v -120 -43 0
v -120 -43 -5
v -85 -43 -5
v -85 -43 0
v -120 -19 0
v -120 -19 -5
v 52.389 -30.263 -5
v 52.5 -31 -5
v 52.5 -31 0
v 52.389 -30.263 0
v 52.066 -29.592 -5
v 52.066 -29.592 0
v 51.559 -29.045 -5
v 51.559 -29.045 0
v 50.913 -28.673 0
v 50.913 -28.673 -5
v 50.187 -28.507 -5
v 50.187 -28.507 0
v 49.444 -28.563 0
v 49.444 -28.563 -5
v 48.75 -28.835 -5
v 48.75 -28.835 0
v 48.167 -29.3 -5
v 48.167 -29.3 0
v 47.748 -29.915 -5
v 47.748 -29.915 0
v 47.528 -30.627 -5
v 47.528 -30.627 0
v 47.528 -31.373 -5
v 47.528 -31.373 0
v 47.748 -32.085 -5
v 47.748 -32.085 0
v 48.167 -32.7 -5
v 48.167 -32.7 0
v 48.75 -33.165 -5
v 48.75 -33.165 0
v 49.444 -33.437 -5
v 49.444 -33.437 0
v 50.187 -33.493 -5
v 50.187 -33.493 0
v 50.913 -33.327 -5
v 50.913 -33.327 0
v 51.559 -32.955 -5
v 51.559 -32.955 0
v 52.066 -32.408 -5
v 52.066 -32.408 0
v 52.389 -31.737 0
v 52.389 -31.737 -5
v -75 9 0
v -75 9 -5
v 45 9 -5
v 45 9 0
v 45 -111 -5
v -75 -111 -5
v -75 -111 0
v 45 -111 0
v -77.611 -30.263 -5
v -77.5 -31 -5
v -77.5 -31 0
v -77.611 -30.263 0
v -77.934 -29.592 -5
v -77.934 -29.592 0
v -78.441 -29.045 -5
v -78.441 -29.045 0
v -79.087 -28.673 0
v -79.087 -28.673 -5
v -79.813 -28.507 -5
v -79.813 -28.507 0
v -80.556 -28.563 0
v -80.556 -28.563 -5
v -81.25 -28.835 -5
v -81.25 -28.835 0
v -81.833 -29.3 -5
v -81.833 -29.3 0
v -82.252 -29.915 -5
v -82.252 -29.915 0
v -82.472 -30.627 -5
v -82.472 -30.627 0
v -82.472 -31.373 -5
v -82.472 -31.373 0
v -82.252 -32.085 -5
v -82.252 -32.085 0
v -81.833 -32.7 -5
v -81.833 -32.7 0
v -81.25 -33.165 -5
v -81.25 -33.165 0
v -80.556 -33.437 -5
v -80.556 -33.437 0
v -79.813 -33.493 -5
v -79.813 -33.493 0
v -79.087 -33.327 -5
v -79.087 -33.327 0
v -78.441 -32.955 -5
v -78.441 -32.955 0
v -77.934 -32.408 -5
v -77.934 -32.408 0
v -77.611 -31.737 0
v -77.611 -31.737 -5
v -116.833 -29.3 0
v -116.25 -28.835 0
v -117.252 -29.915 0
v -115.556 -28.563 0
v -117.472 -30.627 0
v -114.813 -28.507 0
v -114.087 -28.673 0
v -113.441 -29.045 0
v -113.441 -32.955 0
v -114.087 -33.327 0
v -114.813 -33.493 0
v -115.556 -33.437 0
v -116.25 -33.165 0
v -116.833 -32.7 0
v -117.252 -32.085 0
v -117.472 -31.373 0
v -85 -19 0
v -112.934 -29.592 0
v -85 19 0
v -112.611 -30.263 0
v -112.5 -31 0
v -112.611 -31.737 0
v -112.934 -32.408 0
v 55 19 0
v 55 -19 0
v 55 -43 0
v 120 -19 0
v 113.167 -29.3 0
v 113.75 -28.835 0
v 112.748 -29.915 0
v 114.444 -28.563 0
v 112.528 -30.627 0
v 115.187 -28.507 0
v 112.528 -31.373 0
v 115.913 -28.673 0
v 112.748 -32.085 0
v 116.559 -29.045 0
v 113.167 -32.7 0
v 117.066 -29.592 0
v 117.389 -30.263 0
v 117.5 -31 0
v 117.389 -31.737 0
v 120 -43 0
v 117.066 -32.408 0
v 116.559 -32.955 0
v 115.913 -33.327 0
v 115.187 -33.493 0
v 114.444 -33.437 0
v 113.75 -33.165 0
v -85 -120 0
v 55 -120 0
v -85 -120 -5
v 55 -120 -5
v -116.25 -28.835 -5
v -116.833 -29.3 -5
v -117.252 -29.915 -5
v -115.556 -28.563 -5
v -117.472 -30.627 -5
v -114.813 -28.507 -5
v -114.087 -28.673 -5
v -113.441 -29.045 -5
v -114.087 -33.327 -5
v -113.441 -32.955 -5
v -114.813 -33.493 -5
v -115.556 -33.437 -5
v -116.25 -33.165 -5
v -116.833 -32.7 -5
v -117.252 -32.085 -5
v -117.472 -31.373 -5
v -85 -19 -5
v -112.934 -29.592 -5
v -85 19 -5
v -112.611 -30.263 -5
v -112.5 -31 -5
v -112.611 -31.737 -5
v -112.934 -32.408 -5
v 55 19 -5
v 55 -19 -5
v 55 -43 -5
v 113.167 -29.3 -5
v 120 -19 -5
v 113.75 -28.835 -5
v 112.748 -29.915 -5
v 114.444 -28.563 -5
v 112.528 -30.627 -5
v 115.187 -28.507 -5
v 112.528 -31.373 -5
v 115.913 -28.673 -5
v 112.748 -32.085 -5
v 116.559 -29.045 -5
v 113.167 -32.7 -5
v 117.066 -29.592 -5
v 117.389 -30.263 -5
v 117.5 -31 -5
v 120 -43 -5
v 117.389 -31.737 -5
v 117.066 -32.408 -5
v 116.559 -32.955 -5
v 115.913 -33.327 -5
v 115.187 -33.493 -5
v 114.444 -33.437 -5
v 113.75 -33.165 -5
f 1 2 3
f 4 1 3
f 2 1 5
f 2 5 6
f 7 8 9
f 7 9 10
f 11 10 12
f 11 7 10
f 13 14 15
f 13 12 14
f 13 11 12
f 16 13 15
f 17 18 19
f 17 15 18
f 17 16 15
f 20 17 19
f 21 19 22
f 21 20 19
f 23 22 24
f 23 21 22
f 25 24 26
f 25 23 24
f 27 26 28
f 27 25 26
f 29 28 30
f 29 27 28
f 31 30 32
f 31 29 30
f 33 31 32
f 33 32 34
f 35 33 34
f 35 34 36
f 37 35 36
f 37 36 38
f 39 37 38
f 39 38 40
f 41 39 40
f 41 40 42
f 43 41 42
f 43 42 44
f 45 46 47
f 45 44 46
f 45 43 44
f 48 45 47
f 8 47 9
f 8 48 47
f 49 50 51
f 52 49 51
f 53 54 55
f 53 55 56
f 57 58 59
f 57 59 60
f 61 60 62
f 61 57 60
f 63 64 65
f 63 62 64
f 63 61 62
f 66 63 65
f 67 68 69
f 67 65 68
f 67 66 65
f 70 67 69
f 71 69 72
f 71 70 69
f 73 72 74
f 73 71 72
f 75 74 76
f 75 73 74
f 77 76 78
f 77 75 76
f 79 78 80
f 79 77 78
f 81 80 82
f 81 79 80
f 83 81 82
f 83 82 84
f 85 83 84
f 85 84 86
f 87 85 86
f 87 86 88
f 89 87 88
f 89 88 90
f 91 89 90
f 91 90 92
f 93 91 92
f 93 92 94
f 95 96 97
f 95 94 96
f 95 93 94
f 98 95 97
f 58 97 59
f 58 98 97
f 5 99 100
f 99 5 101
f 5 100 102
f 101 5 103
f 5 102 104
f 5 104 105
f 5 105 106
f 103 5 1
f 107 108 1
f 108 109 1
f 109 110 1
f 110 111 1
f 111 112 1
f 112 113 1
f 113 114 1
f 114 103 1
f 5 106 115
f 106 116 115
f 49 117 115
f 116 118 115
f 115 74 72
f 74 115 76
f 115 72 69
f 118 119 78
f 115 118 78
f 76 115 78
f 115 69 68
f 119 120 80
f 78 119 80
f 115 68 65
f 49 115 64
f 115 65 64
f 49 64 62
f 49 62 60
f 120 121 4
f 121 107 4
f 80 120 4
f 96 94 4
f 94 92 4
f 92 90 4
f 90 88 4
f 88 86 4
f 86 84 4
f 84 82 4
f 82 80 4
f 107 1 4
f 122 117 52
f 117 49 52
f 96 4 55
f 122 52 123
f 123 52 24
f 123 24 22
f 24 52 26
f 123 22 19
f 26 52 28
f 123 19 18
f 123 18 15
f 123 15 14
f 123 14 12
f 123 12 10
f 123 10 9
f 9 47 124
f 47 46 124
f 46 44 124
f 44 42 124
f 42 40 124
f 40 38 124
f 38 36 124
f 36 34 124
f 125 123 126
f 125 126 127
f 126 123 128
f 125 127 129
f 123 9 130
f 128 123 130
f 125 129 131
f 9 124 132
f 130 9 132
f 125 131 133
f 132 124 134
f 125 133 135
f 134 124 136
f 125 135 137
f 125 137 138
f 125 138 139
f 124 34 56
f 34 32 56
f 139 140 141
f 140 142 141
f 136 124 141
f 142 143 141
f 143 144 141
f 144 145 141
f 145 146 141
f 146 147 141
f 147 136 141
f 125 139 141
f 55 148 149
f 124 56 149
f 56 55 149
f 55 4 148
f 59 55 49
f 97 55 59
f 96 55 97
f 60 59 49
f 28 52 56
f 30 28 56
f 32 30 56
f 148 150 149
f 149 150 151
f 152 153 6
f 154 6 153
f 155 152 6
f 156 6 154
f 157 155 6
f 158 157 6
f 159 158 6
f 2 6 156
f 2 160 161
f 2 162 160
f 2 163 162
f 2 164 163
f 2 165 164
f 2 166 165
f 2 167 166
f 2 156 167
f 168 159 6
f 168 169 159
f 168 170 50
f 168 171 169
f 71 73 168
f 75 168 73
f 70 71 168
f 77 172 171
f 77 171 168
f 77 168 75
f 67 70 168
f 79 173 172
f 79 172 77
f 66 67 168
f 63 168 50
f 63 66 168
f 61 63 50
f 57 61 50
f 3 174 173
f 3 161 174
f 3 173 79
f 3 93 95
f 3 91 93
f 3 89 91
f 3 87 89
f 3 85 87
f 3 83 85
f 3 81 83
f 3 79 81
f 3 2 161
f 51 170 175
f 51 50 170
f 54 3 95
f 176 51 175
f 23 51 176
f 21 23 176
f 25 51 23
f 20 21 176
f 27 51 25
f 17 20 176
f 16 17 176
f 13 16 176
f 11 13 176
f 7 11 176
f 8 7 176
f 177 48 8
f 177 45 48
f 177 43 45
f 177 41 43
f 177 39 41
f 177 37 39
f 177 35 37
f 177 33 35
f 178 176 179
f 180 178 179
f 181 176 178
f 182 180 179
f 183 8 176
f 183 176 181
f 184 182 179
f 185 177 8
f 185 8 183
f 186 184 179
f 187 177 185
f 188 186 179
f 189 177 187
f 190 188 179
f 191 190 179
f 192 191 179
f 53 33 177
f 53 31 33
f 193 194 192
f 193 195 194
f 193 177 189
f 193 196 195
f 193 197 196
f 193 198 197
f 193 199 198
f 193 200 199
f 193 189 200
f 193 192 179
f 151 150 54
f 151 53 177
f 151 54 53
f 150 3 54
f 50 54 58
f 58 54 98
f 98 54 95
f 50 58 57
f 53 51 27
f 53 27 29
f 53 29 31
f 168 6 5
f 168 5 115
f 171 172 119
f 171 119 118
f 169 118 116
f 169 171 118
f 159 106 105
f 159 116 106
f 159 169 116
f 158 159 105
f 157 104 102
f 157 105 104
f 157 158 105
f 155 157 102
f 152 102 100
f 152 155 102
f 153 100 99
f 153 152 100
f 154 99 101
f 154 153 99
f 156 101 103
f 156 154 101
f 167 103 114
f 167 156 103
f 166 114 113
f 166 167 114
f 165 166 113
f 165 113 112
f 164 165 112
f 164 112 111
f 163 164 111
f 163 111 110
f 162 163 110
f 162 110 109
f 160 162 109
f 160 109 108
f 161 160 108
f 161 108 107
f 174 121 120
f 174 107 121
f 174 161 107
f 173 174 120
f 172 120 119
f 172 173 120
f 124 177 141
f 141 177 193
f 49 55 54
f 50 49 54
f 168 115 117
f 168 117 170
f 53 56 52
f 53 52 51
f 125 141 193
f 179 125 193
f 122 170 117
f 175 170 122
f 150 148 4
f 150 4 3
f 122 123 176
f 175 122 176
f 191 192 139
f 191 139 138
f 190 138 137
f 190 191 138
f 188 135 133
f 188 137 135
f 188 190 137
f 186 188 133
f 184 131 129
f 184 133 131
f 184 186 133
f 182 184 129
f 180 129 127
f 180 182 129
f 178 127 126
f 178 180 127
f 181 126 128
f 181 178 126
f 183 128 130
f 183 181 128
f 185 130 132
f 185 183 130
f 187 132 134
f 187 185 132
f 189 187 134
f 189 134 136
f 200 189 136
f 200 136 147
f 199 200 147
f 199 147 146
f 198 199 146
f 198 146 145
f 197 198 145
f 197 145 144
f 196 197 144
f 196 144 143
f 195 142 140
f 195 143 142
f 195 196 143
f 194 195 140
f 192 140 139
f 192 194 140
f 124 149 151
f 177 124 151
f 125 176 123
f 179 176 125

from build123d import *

# Parameters (mm, degrees)
BOX019_W               = 120
BOX019_H               = 30
BOX019_DEPTH           = 120
CYLINDER075_R          = 2.5
CYLINDER075_DEPTH      = 10
CYLINDER076_R          = 2.5
CYLINDER076_DEPTH      = 10
CYLINDER077_R          = 2.5
CYLINDER077_DEPTH      = 10
CYLINDER078_R          = 2.5
CYLINDER078_DEPTH      = 10
CYLINDER074_R          = 2.5
CYLINDER074_DEPTH      = 10
CYLINDER079_R          = 2.5
CYLINDER079_DEPTH      = 10
BOX016_W               = 240
BOX016_H               = 5
BOX016_DEPTH           = 24
BOX017_W               = 140
BOX017_H               = 5
BOX017_DEPTH           = 38
BOX018_W               = 140
BOX018_H               = 5
BOX018_DEPTH           = 77
CUT010_PLACEMENT_ANGLE = 270


with BuildPart() as gatewaycut002:
    # Box019 → Box019 (new body)
    with BuildSketch(Plane(origin=(-75, -3.2, -111), x_dir=(1, 0, 0), z_dir=(0, 0, 1))):
        with Locations((60, 15)):
            Rectangle(BOX019_W, BOX019_H)
    extrude(amount=BOX019_DEPTH)


with BuildPart() as cylinder075:
    # Cylinder075 → Cylinder075 (new body)
    with BuildSketch(Plane(origin=(115, 0, -31), x_dir=(1, 0, 0), z_dir=(0, -1, 0))):
        Circle(CYLINDER075_R)
    extrude(amount=CYLINDER075_DEPTH)


with BuildPart() as cylinder076:
    # Cylinder076 → Cylinder076 (new body)
    with BuildSketch(Plane(origin=(-80, 0, -31), x_dir=(1, 0, 0), z_dir=(0, -1, 0))):
        Circle(CYLINDER076_R)
    extrude(amount=CYLINDER076_DEPTH)


with BuildPart() as cylinder077:
    # Cylinder077 → Cylinder077 (new body)
    with BuildSketch(Plane(origin=(50, 0, -31), x_dir=(1, 0, 0), z_dir=(0, -1, 0))):
        Circle(CYLINDER077_R)
    extrude(amount=CYLINDER077_DEPTH)


with BuildPart() as cylinder078:
    # Cylinder078 → Cylinder078 (new body)
    with BuildSketch(Plane(origin=(-45.75, 0, -56.3), x_dir=(1, 0, 0), z_dir=(0, -1, 0))):
        Circle(CYLINDER078_R)
    extrude(amount=CYLINDER078_DEPTH)


with BuildPart() as cylinder074:
    # Cylinder074 → Cylinder074 (new body)
    with BuildSketch(Plane(origin=(-115, 0, -31), x_dir=(1, 0, 0), z_dir=(0, -1, 0))):
        Circle(CYLINDER074_R)
    extrude(amount=CYLINDER074_DEPTH)


with BuildPart() as m3heatsetinserts004:
    # Cylinder079 → Cylinder079 (new body)
    with BuildSketch(Plane(origin=(-45.75, 0, -1.3), x_dir=(1, 0, 0), z_dir=(0, -1, 0))):
        Circle(CYLINDER079_R)
    extrude(amount=CYLINDER079_DEPTH)

    # Fusion028: union Cylinder075, Cylinder076, Cylinder077, Cylinder078, Cylinder074
    add(cylinder075.part)
    add(cylinder076.part)
    add(cylinder077.part)
    add(cylinder078.part)
    add(cylinder074.part)


with BuildPart() as m3heatsetinserts004_1:
    # Fusion028 placement: moved
    add(m3heatsetinserts004.part.moved(Location((0, 5.1, 0))))


with BuildPart() as cube013:
    # Box016 → Box016 (new body)
    with BuildSketch(Plane(origin=(-120, 0, -43), x_dir=(1, 0, 0), z_dir=(0, 0, 1))):
        with Locations((120, 2.5)):
            Rectangle(BOX016_W, BOX016_H)
    extrude(amount=BOX016_DEPTH)


with BuildPart() as cube014:
    # Box017 → Box017 (new body)
    with BuildSketch(Plane(origin=(-85, 0, -19), x_dir=(1, 0, 0), z_dir=(0, 0, 1))):
        with Locations((70, 2.5)):
            Rectangle(BOX017_W, BOX017_H)
    extrude(amount=BOX017_DEPTH)


with BuildPart() as mainbasev2:
    # Box018 → Box018 (new body)
    with BuildSketch(Plane(origin=(-85, 0, -120), x_dir=(1, 0, 0), z_dir=(0, 0, 1))):
        with Locations((70, 2.5)):
            Rectangle(BOX018_W, BOX018_H)
    extrude(amount=BOX018_DEPTH)

    # Fusion027: union Cube013, Cube014
    add(cube013.part)
    add(cube014.part)

    # Cut009: cut M3HeatSetInserts004
    add(m3heatsetinserts004_1.part, mode=Mode.SUBTRACT)

    # Cut010: cut GatewayCut002
    add(gatewaycut002.part, mode=Mode.SUBTRACT)


with BuildPart() as mainbasev2_1:
    # Cut010 placement: moved
    add(mainbasev2.part.rotate(Axis((0, 0, 0), (1, 0, 0)), CUT010_PLACEMENT_ANGLE))


solid = mainbasev2_1.part
